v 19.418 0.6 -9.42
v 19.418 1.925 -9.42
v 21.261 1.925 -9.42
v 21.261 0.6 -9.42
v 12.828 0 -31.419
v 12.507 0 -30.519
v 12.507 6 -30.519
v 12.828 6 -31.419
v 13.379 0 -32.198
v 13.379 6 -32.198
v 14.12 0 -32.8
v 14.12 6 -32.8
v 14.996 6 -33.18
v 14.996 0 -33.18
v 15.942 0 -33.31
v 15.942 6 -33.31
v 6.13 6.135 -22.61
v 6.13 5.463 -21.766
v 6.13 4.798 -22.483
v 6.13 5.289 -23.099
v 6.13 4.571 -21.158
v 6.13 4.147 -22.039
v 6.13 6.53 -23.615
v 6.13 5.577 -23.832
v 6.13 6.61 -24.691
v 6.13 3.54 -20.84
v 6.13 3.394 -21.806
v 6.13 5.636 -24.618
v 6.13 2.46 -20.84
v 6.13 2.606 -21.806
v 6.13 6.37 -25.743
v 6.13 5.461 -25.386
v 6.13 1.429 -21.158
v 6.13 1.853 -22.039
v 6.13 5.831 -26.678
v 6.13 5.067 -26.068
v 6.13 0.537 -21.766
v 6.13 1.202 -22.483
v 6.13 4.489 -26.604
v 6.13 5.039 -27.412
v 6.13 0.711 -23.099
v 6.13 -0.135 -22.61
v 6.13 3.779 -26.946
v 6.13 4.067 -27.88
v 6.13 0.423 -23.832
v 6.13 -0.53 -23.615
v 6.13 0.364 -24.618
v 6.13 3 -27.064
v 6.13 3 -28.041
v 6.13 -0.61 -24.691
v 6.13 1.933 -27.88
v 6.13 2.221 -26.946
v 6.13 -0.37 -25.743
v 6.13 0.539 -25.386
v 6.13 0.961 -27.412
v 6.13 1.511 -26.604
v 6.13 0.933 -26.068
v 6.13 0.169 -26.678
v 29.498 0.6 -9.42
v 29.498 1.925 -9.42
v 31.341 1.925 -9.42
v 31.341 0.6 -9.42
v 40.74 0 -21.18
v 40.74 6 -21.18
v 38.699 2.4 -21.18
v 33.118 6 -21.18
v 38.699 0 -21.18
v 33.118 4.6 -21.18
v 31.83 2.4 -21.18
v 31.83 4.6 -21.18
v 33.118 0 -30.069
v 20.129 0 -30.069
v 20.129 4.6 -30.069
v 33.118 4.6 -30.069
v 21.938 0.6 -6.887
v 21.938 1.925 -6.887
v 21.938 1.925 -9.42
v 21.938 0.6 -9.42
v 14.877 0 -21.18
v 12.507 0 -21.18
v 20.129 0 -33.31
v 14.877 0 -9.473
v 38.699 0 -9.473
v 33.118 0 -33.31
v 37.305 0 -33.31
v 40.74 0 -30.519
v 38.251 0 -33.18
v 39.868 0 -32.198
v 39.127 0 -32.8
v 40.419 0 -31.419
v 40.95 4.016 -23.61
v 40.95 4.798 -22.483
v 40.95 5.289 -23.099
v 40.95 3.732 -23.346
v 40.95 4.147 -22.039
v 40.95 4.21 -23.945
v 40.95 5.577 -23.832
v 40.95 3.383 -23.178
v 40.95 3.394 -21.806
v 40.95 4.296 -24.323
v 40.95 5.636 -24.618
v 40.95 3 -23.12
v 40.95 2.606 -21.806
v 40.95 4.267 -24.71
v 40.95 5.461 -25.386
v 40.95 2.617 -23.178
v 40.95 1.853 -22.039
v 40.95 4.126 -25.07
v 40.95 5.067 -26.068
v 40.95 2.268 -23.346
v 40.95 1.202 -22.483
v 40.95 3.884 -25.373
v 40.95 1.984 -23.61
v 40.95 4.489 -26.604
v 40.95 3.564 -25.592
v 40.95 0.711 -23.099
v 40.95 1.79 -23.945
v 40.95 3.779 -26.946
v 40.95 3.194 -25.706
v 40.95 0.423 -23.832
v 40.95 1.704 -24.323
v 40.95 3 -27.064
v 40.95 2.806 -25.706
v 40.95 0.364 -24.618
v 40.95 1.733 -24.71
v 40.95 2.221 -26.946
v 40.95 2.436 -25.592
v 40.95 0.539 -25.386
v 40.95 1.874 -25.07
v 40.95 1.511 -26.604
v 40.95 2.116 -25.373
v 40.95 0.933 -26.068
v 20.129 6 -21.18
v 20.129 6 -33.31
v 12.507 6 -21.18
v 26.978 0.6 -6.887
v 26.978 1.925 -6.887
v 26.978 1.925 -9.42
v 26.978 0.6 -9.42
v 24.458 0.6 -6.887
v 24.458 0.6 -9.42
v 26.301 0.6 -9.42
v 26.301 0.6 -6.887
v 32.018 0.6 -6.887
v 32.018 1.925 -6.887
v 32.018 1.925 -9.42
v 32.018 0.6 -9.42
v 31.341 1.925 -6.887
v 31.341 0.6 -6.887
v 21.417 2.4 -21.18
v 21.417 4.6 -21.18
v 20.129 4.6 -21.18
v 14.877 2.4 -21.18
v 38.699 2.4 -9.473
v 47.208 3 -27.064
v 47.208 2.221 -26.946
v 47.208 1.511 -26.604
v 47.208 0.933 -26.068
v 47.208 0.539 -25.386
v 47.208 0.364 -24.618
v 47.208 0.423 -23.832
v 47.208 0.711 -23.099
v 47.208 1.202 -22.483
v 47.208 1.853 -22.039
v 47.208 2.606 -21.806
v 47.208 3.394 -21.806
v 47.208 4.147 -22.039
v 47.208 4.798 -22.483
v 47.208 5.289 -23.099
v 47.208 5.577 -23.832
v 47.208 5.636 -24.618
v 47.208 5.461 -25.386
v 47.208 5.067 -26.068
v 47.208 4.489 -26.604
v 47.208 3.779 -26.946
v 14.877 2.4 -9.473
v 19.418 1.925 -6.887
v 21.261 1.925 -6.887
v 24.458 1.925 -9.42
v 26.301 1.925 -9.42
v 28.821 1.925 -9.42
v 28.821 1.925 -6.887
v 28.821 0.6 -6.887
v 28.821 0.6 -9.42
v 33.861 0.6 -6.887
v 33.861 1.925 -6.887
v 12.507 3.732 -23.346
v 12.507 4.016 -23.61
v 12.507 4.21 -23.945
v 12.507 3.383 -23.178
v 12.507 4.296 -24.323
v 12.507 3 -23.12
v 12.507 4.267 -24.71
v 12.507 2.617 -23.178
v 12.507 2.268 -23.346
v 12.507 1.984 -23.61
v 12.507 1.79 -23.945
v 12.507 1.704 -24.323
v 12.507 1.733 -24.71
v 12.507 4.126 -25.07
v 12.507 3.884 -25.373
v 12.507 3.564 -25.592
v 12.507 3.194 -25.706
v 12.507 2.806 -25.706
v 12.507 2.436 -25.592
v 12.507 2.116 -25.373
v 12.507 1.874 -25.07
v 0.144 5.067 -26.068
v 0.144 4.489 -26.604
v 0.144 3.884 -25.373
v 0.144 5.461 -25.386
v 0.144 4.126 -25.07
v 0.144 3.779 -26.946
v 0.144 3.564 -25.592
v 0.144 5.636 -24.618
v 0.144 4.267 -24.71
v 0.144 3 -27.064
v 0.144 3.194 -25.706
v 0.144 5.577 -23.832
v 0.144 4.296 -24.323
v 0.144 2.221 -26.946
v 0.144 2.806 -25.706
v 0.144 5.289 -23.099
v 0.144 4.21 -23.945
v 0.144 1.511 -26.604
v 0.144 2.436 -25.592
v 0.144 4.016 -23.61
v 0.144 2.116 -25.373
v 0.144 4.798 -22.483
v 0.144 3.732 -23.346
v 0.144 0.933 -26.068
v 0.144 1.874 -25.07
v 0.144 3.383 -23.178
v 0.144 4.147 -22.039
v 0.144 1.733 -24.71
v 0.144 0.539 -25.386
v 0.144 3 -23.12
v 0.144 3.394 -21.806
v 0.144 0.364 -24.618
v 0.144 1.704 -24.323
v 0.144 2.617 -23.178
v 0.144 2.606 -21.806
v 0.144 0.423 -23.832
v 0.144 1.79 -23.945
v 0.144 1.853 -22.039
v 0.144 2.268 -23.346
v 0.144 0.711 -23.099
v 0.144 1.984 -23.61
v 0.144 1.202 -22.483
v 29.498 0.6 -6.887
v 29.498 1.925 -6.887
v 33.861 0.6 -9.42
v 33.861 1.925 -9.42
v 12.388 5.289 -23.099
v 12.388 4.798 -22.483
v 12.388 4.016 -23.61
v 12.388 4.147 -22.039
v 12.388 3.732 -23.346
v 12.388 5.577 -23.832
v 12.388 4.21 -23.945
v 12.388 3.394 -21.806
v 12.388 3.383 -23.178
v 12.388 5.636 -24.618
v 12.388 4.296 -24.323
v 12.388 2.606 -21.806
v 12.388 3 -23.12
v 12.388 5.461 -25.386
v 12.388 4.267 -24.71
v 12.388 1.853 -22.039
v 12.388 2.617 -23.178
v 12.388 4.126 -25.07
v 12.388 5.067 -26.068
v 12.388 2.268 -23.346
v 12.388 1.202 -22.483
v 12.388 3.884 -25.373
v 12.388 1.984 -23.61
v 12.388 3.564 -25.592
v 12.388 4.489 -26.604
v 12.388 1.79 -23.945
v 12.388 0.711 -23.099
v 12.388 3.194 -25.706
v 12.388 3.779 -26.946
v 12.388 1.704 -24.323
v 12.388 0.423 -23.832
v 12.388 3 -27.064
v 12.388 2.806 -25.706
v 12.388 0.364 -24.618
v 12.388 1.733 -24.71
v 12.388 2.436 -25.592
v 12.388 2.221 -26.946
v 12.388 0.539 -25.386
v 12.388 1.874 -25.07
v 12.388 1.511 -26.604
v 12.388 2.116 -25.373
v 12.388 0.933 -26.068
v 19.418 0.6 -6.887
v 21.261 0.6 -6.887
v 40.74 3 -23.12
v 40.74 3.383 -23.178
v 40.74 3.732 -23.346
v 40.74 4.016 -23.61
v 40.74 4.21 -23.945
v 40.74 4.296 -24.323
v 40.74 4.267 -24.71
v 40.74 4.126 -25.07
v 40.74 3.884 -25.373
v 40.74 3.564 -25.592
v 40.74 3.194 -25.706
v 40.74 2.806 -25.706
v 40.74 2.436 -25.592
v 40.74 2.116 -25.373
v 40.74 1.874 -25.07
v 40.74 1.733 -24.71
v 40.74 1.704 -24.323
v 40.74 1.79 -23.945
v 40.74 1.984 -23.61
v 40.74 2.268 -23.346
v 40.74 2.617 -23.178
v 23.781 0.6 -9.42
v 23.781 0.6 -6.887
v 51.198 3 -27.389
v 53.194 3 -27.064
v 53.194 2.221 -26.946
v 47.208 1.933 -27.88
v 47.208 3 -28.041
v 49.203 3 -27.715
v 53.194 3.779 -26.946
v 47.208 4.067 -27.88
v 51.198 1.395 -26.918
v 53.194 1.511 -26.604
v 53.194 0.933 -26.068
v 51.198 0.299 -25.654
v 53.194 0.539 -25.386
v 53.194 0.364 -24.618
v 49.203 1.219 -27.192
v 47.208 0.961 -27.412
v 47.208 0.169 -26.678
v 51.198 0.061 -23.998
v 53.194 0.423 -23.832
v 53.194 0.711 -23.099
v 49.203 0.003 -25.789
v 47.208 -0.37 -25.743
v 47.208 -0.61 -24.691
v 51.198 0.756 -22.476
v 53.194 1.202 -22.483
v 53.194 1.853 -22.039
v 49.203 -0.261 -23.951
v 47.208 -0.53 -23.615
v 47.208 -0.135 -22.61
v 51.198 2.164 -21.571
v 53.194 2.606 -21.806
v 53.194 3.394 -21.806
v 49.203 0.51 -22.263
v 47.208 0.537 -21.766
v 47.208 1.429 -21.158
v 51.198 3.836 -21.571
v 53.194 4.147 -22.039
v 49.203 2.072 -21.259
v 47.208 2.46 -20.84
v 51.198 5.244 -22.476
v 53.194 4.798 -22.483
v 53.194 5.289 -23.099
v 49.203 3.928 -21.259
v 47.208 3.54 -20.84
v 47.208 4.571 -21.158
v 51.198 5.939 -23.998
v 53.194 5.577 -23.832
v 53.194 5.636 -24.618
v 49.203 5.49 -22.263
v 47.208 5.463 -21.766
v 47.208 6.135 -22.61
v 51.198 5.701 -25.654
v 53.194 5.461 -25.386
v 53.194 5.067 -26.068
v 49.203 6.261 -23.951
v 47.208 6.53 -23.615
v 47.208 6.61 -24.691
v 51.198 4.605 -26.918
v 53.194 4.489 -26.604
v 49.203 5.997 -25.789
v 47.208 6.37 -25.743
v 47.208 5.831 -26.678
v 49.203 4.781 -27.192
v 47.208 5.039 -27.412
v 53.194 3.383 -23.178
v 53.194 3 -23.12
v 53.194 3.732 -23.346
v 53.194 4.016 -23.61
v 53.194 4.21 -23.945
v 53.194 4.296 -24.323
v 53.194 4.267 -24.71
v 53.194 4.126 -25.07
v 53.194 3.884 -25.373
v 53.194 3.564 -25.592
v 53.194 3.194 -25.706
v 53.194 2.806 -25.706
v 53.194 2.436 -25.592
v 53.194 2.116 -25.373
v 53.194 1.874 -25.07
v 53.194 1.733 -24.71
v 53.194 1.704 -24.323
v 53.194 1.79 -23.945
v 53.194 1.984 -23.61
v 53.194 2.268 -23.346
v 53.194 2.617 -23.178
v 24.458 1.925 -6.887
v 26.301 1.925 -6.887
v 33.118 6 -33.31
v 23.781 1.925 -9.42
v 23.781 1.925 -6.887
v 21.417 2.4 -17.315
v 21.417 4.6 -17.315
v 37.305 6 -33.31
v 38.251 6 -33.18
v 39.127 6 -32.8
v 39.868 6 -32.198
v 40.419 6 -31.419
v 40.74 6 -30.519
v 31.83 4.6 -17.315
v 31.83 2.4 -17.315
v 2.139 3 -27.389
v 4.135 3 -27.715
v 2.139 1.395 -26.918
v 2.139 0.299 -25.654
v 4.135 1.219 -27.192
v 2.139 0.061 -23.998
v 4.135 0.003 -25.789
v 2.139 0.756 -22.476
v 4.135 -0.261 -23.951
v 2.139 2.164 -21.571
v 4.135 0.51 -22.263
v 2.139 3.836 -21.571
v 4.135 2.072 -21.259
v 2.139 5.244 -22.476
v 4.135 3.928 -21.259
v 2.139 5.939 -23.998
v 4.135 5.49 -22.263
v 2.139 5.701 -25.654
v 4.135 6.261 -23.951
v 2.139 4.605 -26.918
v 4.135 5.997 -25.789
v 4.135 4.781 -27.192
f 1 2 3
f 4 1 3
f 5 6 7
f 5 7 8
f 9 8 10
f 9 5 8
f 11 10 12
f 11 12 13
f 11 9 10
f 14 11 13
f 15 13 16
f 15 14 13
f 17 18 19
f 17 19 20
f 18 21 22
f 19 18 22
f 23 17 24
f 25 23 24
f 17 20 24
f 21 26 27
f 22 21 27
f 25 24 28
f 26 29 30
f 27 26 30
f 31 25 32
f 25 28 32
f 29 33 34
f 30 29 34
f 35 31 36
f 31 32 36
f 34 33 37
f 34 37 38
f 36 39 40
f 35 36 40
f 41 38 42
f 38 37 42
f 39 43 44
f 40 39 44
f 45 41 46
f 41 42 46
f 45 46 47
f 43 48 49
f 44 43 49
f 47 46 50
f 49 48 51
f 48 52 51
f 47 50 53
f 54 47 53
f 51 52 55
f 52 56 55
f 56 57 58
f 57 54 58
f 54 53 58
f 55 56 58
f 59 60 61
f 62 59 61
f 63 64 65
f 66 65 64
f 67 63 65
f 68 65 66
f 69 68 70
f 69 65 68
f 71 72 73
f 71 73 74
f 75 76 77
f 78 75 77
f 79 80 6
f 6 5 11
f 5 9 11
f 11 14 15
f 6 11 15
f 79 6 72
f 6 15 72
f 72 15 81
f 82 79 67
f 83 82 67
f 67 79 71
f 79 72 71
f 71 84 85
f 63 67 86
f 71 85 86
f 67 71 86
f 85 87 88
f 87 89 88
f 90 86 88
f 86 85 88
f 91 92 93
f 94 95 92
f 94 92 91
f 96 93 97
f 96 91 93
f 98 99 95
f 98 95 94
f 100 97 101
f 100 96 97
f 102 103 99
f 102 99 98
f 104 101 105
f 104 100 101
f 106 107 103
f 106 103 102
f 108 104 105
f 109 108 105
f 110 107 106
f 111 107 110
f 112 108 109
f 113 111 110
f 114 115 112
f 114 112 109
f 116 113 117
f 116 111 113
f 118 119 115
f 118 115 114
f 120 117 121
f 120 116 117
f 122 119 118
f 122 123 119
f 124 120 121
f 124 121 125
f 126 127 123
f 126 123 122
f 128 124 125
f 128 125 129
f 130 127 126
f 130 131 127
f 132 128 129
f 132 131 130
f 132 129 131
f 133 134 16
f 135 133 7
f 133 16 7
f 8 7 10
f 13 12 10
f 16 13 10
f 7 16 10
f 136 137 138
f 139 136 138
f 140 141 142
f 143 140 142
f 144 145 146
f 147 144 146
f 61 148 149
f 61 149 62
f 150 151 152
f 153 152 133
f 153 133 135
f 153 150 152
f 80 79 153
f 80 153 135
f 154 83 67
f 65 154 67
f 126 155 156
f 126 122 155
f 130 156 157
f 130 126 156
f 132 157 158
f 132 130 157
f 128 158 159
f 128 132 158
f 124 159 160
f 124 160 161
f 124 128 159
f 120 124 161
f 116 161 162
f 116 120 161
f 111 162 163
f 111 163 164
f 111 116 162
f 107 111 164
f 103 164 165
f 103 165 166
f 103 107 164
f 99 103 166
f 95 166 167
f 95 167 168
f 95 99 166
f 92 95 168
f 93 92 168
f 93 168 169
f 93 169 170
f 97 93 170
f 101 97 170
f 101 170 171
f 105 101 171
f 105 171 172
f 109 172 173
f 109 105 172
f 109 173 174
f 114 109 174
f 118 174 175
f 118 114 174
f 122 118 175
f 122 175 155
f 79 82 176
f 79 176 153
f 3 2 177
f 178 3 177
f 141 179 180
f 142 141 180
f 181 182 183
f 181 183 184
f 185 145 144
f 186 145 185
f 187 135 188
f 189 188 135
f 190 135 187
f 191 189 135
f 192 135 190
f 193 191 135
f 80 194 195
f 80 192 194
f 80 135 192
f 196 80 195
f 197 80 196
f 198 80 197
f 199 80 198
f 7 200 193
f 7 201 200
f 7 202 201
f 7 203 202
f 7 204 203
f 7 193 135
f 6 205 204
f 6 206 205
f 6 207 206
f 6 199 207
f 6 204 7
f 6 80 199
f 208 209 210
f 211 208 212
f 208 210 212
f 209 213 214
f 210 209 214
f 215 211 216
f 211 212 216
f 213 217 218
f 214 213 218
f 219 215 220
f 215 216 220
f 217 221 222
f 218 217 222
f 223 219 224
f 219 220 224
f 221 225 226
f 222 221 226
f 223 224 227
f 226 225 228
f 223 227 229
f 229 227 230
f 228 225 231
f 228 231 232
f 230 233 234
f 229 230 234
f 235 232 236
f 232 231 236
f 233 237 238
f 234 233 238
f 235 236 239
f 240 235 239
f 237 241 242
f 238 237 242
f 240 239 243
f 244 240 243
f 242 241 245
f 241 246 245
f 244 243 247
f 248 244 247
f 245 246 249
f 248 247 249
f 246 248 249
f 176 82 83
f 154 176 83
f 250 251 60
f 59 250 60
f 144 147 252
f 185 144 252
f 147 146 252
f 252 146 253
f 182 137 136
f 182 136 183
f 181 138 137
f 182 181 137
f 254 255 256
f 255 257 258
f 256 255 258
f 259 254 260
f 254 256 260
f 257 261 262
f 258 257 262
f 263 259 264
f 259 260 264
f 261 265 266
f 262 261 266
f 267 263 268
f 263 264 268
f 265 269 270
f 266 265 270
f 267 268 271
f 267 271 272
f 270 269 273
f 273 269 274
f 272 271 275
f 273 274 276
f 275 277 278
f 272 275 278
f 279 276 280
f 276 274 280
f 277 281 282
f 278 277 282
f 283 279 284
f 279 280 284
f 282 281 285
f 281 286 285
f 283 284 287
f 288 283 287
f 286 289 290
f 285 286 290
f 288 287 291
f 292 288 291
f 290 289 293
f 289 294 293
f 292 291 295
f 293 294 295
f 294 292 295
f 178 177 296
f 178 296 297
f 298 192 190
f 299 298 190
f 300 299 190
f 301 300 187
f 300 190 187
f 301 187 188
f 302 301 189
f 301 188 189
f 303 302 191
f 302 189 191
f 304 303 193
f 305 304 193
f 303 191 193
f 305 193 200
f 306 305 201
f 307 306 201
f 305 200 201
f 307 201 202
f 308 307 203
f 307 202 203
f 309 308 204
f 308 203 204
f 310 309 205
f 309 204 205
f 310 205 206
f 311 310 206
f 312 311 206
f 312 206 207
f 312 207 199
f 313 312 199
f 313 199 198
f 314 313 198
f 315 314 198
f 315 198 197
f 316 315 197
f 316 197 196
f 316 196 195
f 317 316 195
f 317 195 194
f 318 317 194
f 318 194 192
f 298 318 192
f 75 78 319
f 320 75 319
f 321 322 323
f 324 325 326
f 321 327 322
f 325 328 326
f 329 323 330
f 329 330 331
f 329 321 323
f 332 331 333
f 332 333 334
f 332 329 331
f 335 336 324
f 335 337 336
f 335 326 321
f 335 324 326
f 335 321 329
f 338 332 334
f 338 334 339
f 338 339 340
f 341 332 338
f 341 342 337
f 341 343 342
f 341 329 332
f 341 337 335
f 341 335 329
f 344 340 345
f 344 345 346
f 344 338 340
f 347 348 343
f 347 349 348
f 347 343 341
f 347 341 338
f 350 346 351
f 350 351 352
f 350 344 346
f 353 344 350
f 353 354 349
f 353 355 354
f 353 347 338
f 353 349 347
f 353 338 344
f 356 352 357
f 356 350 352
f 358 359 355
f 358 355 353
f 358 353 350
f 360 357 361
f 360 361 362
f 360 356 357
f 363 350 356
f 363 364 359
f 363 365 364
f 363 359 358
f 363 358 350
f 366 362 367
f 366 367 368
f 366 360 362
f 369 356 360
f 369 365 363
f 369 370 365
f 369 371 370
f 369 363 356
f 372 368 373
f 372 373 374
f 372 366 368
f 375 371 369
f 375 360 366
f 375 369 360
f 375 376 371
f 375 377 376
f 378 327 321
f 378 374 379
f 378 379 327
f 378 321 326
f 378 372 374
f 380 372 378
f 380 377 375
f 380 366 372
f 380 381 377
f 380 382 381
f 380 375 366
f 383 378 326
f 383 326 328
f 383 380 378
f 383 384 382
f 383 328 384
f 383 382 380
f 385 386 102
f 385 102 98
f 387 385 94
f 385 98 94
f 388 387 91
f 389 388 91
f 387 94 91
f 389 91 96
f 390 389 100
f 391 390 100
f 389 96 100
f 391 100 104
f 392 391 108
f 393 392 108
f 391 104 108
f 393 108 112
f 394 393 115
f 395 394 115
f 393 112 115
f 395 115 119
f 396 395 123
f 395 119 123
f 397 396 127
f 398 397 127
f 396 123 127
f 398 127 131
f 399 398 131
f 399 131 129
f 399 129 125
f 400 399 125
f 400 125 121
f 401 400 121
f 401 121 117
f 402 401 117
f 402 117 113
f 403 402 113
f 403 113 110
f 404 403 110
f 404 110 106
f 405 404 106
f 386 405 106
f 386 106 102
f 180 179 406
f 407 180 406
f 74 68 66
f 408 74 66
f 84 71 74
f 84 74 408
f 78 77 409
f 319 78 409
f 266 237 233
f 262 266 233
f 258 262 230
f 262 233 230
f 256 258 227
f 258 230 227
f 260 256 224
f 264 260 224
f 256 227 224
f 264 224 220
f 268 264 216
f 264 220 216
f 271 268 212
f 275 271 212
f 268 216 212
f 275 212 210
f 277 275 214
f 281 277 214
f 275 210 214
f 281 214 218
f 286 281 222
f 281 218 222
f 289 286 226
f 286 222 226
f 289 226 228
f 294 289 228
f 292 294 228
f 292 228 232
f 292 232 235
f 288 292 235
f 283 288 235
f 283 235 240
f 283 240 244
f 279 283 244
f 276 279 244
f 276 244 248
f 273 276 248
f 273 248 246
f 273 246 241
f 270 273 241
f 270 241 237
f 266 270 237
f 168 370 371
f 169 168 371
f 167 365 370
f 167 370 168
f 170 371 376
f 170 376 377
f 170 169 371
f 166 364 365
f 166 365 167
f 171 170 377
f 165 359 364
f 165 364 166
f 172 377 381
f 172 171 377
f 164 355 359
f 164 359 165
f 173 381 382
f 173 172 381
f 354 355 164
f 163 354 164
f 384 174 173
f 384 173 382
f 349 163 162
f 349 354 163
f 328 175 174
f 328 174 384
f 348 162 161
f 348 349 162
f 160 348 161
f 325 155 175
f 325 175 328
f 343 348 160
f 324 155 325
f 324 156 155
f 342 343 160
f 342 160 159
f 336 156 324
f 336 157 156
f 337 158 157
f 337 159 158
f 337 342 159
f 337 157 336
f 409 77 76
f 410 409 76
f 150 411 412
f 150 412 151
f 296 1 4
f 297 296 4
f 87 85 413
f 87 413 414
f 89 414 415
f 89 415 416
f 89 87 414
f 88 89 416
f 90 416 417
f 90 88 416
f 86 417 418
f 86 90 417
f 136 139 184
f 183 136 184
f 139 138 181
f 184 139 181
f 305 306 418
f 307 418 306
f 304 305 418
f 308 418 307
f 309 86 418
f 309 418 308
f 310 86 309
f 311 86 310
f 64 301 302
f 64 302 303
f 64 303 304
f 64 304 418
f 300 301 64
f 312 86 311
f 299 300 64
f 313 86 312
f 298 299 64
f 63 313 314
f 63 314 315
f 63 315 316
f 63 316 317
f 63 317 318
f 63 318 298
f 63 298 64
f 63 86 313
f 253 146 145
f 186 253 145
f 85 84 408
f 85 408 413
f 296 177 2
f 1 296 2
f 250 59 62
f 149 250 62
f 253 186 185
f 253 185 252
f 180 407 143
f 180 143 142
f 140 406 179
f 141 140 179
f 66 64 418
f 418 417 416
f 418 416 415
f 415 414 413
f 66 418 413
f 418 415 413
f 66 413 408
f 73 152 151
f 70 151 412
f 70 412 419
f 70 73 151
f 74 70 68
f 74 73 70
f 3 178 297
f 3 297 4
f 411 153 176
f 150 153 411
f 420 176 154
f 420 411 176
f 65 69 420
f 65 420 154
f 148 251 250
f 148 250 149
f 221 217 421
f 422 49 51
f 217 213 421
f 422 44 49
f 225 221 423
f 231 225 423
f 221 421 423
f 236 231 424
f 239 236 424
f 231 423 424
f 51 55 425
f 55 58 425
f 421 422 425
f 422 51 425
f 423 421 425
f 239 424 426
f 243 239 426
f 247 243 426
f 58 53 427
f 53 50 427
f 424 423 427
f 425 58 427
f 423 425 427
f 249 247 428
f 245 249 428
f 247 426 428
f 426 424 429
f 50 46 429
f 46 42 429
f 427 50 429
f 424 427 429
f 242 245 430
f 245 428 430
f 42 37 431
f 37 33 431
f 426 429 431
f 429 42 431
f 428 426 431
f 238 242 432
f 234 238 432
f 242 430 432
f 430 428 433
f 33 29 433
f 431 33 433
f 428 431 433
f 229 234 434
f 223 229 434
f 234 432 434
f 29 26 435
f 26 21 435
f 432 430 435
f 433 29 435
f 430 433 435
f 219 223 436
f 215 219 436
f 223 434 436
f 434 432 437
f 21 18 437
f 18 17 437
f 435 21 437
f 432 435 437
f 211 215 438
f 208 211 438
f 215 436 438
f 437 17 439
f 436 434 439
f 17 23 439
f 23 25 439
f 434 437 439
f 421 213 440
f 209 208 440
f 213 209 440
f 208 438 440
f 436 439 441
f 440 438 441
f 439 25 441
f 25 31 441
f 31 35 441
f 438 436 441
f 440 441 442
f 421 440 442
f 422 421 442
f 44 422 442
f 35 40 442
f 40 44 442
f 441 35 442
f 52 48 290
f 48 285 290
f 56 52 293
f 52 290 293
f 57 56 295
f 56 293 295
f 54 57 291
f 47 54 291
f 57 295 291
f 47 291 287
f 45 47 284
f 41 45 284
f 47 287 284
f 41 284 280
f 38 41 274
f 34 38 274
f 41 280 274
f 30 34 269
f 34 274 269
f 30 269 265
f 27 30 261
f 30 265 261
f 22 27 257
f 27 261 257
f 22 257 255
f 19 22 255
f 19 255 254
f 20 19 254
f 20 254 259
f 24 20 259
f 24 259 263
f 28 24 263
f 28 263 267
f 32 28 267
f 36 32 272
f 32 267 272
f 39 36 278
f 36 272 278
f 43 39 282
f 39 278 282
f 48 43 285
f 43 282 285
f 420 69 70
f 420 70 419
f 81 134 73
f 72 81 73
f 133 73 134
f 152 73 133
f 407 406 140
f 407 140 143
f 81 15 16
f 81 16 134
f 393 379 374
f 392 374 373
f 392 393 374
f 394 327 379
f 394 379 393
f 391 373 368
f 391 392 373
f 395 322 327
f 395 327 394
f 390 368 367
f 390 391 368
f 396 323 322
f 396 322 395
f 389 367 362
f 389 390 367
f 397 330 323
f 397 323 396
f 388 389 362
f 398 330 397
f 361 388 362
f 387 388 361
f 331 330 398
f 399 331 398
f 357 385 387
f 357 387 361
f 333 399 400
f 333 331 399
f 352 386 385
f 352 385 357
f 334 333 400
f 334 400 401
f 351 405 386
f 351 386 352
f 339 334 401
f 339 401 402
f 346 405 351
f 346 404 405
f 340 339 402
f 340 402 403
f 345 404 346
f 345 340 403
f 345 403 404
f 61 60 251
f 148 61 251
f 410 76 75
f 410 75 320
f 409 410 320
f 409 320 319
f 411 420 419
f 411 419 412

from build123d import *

# Parameters (mm, degrees)
EXTRUDE_2_DEPTH     = 6
SKETCH_2_W          = 23.822154329
SKETCH_2_H          = 20.596237597
EXTRUDE_3_DEPTH     = 2.4
SKETCH_6_W          = 12.989320898
SKETCH_6_H          = 13.80541812
CUT_EXTRUDE_2_DEPTH = 1.4
SKETCH_9_R          = 1.3
CUT_EXTRUDE_3_DEPTH = 63.989512989
SKETCH_10_W         = 1.843378815
SKETCH_10_H         = 2.532293836
EXTRUDE_4_DEPTH     = 2.4
EXTRUDE_4_2_DEPTH   = 2.4
EXTRUDE_4_3_DEPTH   = 2.4
EXTRUDE_4_4_DEPTH   = 2.4
EXTRUDE_4_5_DEPTH   = 2.4
EXTRUDE_4_6_DEPTH   = 2.4
SKETCH_11_W         = 2.532293836
SKETCH_11_H         = 1.074591371
CUT_EXTRUDE_4_DEPTH = 19.4


with BuildPart() as part:
    # 草图4 → 凸台-拉伸2 (new body)
    with BuildSketch(Plane(origin=(0, 0, 0), x_dir=(1, 0, 0), z_dir=(0, 1, 0))):
        with BuildLine():
            Line((20.128677299, 33.310340592), (20.128677299, 30.069083715))
            Line((20.128677299, 30.069083715), (33.117998197, 30.069083715))
            Line((33.117998197, 30.069083715), (33.117998197, 33.310340592))
            Line((33.117998197, 33.310340592), (37.304638817, 33.310340592))
            ThreePointArc((37.304638817, 33.310340592), (39.517710804, 32.52461013), (40.739831121, 30.519246845))
            Line((40.739831121, 30.519246845), (40.739831121, 21.179817769))
            Line((40.739831121, 21.179817769), (31.829801083, 21.179817769))
            Line((31.829801083, 21.179817769), (31.829801083, 17.315226428))
            Line((31.829801083, 17.315226428), (21.416874413, 17.315226428))
            Line((21.416874413, 17.315226428), (21.416874413, 21.179817769))
            Line((21.416874413, 21.179817769), (12.506844375, 21.179817769))
            Line((12.506844375, 21.179817769), (12.506844375, 30.519246845))
            ThreePointArc((12.506844375, 30.519246845), (13.728964692, 32.52461013), (15.942036679, 33.310340592))
            Line((15.942036679, 33.310340592), (20.128677299, 33.310340592))
        make_face()
    extrude(amount=EXTRUDE_2_DEPTH)

    # 草图2 → 凸台-拉伸3 (add)
    with BuildSketch(Plane(origin=(0, 0, 0), x_dir=(1, 0, 0), z_dir=(0, 1, 0))):
        with Locations((26.78772687, 19.770964917)):
            Rectangle(SKETCH_2_W, SKETCH_2_H)
    extrude(amount=EXTRUDE_3_DEPTH)

    # 草图6 → 切除-拉伸2 (cut)
    with BuildSketch(Plane(origin=(0, 6, 0), x_dir=(1, 0, 0), z_dir=(0, 1, 0))):
        with Locations((26.623337748, 23.166374655)):
            Rectangle(SKETCH_6_W, SKETCH_6_H)
    extrude(amount=-CUT_EXTRUDE_2_DEPTH, mode=Mode.SUBTRACT)


with BuildPart() as body_2:
    # 草图8 → 旋转5 (revolve)
    with BuildSketch(Plane(origin=(0, 3, 0), x_dir=(1, 0, 0), z_dir=(0, 1, 0))):
        Polygon((6.129946748, 27.063649251), (12.387902832, 27.063649251), (12.387902832, 24.420252834), (0.143941454, 24.420252834), (0.143941454, 27.063649251), (6.129946748, 28.040720085), align=None)
        Polygon((47.207623903, 28.040720085), (47.207623903, 27.063649251), (40.94966782, 27.063649251), (40.94966782, 24.420252834), (53.193629197, 24.420252834), (53.193629197, 27.063649251), align=None)
    revolve(axis=Axis((12.387902832, 3, -24.420252834), (-1, 0, 0)))


with BuildPart() as cut_extrude_3_tool:
    # 草图9 → 切除-拉伸3 (new, through all)
    with BuildSketch(Plane.ZY.offset(-0.143941454)):
        with Locations((-24.420252834, 3)):
            Circle(SKETCH_9_R)
    extrude(amount=-CUT_EXTRUDE_3_DEPTH)


with BuildPart() as part_1:
    add(part.part)

    # 切除-拉伸3: cut by cut_extrude_3_tool
    add(cut_extrude_3_tool.part, mode=Mode.SUBTRACT)


with BuildPart() as body_2_1:
    add(body_2.part)

    # 切除-拉伸3: cut by cut_extrude_3_tool
    add(cut_extrude_3_tool.part, mode=Mode.SUBTRACT)


with BuildPart() as body_3:
    # 草图10 → 凸台-拉伸4 (new body)
    with BuildSketch(Plane(origin=(0, 3, 0), x_dir=(1, 0, 0), z_dir=(0, 1, 0))):
        with Locations((22.859385876, 8.153366941)):
            Rectangle(SKETCH_10_W, SKETCH_10_H)
    extrude(amount=-EXTRUDE_4_DEPTH)


with BuildPart() as body_4:
    # 草图10 → Extrude 4 2 (new body)
    with BuildSketch(Plane(origin=(0, 3, 0), x_dir=(1, 0, 0), z_dir=(0, 1, 0))):
        with Locations((20.339385875, 8.153366941)):
            Rectangle(SKETCH_10_W, SKETCH_10_H)
    extrude(amount=-EXTRUDE_4_2_DEPTH)


with BuildPart() as body_5:
    # 草图10 → Extrude 4 3 (new body)
    with BuildSketch(Plane(origin=(0, 3, 0), x_dir=(1, 0, 0), z_dir=(0, 1, 0))):
        with Locations((25.379385876, 8.153366941)):
            Rectangle(SKETCH_10_W, SKETCH_10_H)
    extrude(amount=-EXTRUDE_4_3_DEPTH)


with BuildPart() as body_6:
    # 草图10 → Extrude 4 4 (new body)
    with BuildSketch(Plane(origin=(0, 3, 0), x_dir=(1, 0, 0), z_dir=(0, 1, 0))):
        with Locations((27.899385876, 8.153366941)):
            Rectangle(SKETCH_10_W, SKETCH_10_H)
    extrude(amount=-EXTRUDE_4_4_DEPTH)


with BuildPart() as body_7:
    # 草图10 → Extrude 4 5 (new body)
    with BuildSketch(Plane(origin=(0, 3, 0), x_dir=(1, 0, 0), z_dir=(0, 1, 0))):
        with Locations((30.419385876, 8.153366941)):
            Rectangle(SKETCH_10_W, SKETCH_10_H)
    extrude(amount=-EXTRUDE_4_5_DEPTH)


with BuildPart() as body_8:
    # 草图10 → Extrude 4 6 (new body)
    with BuildSketch(Plane(origin=(0, 3, 0), x_dir=(1, 0, 0), z_dir=(0, 1, 0))):
        with Locations((32.939385876, 8.153366941)):
            Rectangle(SKETCH_10_W, SKETCH_10_H)
    extrude(amount=-EXTRUDE_4_6_DEPTH)


with BuildPart() as cut_extrude_4_tool:
    # 草图11 → 切除-拉伸4 (new body)
    with BuildSketch(Plane.ZY.offset(-19.417696468)):
        with Locations((-8.153366941, 2.462704314)):
            Rectangle(SKETCH_11_W, SKETCH_11_H)
    extrude(amount=-CUT_EXTRUDE_4_DEPTH)


with BuildPart() as body_3_1:
    add(body_3.part)

    # 切除-拉伸4: cut by cut_extrude_4_tool
    add(cut_extrude_4_tool.part, mode=Mode.SUBTRACT)


with BuildPart() as body_4_1:
    add(body_4.part)

    # 切除-拉伸4: cut by cut_extrude_4_tool
    add(cut_extrude_4_tool.part, mode=Mode.SUBTRACT)


with BuildPart() as body_5_1:
    add(body_5.part)

    # 切除-拉伸4: cut by cut_extrude_4_tool
    add(cut_extrude_4_tool.part, mode=Mode.SUBTRACT)


with BuildPart() as body_6_1:
    add(body_6.part)

    # 切除-拉伸4: cut by cut_extrude_4_tool
    add(cut_extrude_4_tool.part, mode=Mode.SUBTRACT)


with BuildPart() as body_7_1:
    add(body_7.part)

    # 切除-拉伸4: cut by cut_extrude_4_tool
    add(cut_extrude_4_tool.part, mode=Mode.SUBTRACT)


with BuildPart() as body_8_1:
    add(body_8.part)

    # 切除-拉伸4: cut by cut_extrude_4_tool
    add(cut_extrude_4_tool.part, mode=Mode.SUBTRACT)


solid = Compound([part_1.part, body_2_1.part, body_3_1.part, body_4_1.part, body_5_1.part, body_6_1.part, body_7_1.part, body_8_1.part])
